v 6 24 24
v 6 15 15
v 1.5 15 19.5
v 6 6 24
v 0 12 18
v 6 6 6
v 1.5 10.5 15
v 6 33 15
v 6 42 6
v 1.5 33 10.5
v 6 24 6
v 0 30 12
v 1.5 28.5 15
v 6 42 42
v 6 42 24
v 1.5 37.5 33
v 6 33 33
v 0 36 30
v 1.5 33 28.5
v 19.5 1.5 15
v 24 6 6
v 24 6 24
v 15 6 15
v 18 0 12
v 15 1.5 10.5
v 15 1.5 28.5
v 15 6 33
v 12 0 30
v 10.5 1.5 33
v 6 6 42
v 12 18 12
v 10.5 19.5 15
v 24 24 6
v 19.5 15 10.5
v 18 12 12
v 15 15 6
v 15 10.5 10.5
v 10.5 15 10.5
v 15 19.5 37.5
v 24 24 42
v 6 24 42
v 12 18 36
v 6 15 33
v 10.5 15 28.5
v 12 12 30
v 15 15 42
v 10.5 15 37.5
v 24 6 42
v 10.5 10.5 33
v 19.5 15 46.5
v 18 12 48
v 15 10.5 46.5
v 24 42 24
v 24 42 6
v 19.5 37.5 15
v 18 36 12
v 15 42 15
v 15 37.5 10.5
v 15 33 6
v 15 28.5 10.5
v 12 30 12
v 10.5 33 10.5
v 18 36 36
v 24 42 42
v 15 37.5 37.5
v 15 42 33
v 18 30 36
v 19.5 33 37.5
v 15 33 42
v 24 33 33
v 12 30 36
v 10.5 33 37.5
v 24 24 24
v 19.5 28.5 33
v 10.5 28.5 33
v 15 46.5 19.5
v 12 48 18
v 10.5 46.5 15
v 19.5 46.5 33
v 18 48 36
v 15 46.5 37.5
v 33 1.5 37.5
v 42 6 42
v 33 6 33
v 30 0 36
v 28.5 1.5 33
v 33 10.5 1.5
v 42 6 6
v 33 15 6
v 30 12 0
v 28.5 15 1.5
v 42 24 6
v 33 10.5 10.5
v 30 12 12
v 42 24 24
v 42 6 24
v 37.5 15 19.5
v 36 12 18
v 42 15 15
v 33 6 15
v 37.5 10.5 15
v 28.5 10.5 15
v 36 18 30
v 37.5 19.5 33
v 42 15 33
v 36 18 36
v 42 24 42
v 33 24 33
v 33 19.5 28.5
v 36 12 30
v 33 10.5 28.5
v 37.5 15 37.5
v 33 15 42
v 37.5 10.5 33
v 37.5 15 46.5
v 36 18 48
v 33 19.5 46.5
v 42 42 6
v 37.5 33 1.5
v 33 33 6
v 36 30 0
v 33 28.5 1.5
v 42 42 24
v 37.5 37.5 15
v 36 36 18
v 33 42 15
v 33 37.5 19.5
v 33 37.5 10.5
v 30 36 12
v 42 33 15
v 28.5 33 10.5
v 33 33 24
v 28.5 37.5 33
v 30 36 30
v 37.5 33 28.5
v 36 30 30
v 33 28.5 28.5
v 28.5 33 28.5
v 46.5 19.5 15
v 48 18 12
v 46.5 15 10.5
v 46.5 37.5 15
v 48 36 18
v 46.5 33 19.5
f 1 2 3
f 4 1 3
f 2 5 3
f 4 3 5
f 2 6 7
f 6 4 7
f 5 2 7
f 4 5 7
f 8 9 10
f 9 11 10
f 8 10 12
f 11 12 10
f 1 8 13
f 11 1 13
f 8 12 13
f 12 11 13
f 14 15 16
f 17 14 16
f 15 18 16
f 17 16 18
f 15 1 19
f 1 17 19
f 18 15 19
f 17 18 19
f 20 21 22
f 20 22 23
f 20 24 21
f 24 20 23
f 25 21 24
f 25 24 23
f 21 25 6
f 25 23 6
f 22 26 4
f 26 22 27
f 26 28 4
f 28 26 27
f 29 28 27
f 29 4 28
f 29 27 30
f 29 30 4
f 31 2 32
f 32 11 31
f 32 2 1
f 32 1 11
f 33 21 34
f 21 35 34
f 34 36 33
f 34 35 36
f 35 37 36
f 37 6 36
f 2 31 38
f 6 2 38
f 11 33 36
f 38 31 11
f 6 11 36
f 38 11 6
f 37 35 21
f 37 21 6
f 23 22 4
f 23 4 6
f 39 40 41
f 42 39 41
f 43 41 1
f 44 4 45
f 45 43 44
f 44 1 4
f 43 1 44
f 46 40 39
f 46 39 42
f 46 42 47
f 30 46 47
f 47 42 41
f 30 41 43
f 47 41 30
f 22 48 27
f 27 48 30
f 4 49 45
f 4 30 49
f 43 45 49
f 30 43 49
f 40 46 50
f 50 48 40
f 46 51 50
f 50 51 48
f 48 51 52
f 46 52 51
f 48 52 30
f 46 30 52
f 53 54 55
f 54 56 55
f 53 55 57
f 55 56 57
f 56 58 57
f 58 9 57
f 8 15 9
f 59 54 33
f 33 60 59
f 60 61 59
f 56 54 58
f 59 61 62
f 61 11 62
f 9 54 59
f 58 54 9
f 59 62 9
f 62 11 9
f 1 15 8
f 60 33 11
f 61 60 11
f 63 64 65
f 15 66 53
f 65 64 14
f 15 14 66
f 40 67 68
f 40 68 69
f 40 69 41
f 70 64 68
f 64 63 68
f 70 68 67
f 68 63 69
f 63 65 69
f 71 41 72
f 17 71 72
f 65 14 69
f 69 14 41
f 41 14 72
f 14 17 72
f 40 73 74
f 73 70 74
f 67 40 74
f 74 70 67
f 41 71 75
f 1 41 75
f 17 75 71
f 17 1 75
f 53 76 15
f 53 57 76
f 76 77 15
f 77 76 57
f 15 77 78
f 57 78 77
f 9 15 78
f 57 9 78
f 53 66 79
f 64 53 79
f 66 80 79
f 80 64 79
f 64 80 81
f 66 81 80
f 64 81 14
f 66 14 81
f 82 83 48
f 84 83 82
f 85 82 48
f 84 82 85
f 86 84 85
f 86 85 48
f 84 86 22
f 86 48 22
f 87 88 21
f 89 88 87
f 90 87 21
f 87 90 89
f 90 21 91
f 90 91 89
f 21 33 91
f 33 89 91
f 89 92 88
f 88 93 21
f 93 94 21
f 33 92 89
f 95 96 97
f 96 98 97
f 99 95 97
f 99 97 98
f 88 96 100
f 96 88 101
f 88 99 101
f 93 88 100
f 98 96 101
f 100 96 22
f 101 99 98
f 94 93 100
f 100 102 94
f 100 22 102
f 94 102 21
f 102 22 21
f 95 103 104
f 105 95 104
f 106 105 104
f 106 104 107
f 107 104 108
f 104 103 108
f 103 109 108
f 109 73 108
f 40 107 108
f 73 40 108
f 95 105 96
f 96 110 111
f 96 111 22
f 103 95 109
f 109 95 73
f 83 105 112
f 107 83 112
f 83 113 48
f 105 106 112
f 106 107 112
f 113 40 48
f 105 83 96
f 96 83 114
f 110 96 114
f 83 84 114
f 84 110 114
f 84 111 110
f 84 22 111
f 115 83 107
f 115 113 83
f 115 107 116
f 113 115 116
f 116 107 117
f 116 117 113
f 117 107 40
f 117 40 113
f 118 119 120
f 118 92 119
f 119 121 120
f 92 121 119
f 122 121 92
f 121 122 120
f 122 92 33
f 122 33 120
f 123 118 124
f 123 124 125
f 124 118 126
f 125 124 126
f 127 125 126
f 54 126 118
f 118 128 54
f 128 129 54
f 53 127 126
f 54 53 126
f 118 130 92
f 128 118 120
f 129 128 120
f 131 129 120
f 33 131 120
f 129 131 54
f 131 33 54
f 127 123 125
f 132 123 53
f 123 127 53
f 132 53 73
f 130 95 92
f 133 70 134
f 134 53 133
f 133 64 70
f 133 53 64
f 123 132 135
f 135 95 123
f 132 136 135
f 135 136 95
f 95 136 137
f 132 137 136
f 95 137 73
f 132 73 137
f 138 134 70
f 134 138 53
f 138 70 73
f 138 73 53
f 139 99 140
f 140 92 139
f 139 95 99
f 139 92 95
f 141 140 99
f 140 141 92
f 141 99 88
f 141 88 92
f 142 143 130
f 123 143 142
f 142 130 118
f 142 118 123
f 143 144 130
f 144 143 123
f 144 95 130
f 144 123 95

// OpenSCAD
// Chair44: centered apex (2,1,1) on the original side-3 cube.
// Exact merged-cavity boundary: 98 planar faces, 284 mesh triangles.
// Change overall_width_mm to resize uniformly; dimensions are millimeters.
overall_width_mm = 48;
points_lattice = [[4,16,16],[4,10,10],[1,10,13],[4,4,16],[0,8,12],[4,4,4],[1,7,10],[4,22,10],[4,28,4],[1,22,7],[4,16,4],[0,20,8],[1,19,10],[4,28,28],[4,28,16],[1,25,22],[4,22,22],[0,24,20],[1,22,19],[13,1,10],[16,4,4],[16,4,16],[10,4,10],[12,0,8],[10,1,7],[10,1,19],[10,4,22],[8,0,20],[7,1,22],[4,4,28],[8,12,8],[7,13,10],[16,16,4],[13,10,7],[12,8,8],[10,10,4],[10,7,7],[7,10,7],[10,13,25],[16,16,28],[4,16,28],[8,12,24],[4,10,22],[7,10,19],[8,8,20],[10,10,28],[7,10,25],[16,4,28],[7,7,22],[13,10,31],[12,8,32],[10,7,31],[16,28,16],[16,28,4],[13,25,10],[12,24,8],[10,28,10],[10,25,7],[10,22,4],[10,19,7],[8,20,8],[7,22,7],[12,24,24],[16,28,28],[10,25,25],[10,28,22],[12,20,24],[13,22,25],[10,22,28],[16,22,22],[8,20,24],[7,22,25],[16,16,16],[13,19,22],[7,19,22],[10,31,13],[8,32,12],[7,31,10],[13,31,22],[12,32,24],[10,31,25],[22,1,25],[28,4,28],[22,4,22],[20,0,24],[19,1,22],[22,7,1],[28,4,4],[22,10,4],[20,8,0],[19,10,1],[28,16,4],[22,7,7],[20,8,8],[28,16,16],[28,4,16],[25,10,13],[24,8,12],[28,10,10],[22,4,10],[25,7,10],[19,7,10],[24,12,20],[25,13,22],[28,10,22],[24,12,24],[28,16,28],[22,16,22],[22,13,19],[24,8,20],[22,7,19],[25,10,25],[22,10,28],[25,7,22],[25,10,31],[24,12,32],[22,13,31],[28,28,4],[25,22,1],[22,22,4],[24,20,0],[22,19,1],[28,28,16],[25,25,10],[24,24,12],[22,28,10],[22,25,13],[22,25,7],[20,24,8],[28,22,10],[19,22,7],[22,22,16],[19,25,22],[20,24,20],[25,22,19],[24,20,20],[22,19,19],[19,22,19],[31,13,10],[32,12,8],[31,10,7],[31,25,10],[32,24,12],[31,22,13]];
faces_clockwise = [[2,1,0],[2,0,3],[2,4,1],[4,2,3],[6,5,1],[6,3,5],[6,1,4],[6,4,3],[9,8,7],[9,10,8],[11,9,7],[9,11,10],[12,7,0],[12,0,10],[12,11,7],[12,10,11],[15,14,13],[15,13,16],[15,17,14],[17,15,16],[18,0,14],[18,16,0],[18,14,17],[18,17,16],[21,20,19],[22,21,19],[20,23,19],[22,19,23],[23,20,24],[22,23,24],[5,24,20],[5,22,24],[3,25,21],[26,21,25],[3,27,25],[26,25,27],[26,27,28],[27,3,28],[29,26,28],[3,29,28],[31,1,30],[30,10,31],[0,1,31],[10,0,31],[33,20,32],[33,34,20],[32,35,33],[35,34,33],[35,36,34],[35,5,36],[37,30,1],[37,1,5],[35,32,10],[10,30,37],[35,10,5],[5,10,37],[20,34,36],[5,20,36],[3,21,22],[5,3,22],[40,39,38],[40,38,41],[0,40,42],[44,3,43],[43,42,44],[3,0,43],[43,0,42],[38,39,45],[41,38,45],[46,41,45],[46,45,29],[40,41,46],[42,40,29],[29,40,46],[26,47,21],[29,47,26],[44,48,3],[48,29,3],[48,44,42],[48,42,29],[49,45,39],[39,47,49],[49,50,45],[47,50,49],[51,50,47],[50,51,45],[29,51,47],[51,29,45],[54,53,52],[54,55,53],[56,54,52],[56,55,54],[56,57,55],[56,8,57],[8,14,7],[32,53,58],[58,59,32],[58,60,59],[57,53,55],[61,60,58],[61,10,60],[58,53,8],[8,53,57],[8,61,58],[8,10,61],[7,14,0],[10,32,59],[10,59,60],[64,63,62],[52,65,14],[13,63,64],[65,13,14],[67,66,39],[68,67,39],[40,68,39],[67,63,69],[67,62,63],[66,67,69],[68,62,67],[68,64,62],[71,40,70],[71,70,16],[68,13,64],[40,13,68],[71,13,40],[71,16,13],[73,72,39],[73,69,72],[73,39,66],[66,69,73],[74,70,40],[74,40,0],[70,74,16],[74,0,16],[14,75,52],[75,56,52],[14,76,75],[56,75,76],[77,76,14],[76,77,56],[77,14,8],[77,8,56],[78,65,52],[78,52,63],[78,79,65],[78,63,79],[80,79,63],[79,80,65],[13,80,63],[80,13,65],[47,82,81],[81,82,83],[47,81,84],[84,81,83],[84,83,85],[47,84,85],[21,85,83],[21,47,85],[20,87,86],[86,87,88],[20,86,89],[88,89,86],[90,20,89],[88,90,89],[90,32,20],[90,88,32],[87,91,88],[20,92,87],[20,93,92],[88,91,32],[96,95,94],[96,97,95],[96,94,98],[97,96,98],[99,95,87],[100,87,95],[100,98,87],[99,87,92],[100,95,97],[21,95,99],[97,98,100],[99,92,93],[93,101,99],[101,21,99],[20,101,93],[20,21,101],[103,102,94],[103,94,104],[103,104,105],[106,103,105],[107,103,106],[107,102,103],[107,108,102],[107,72,108],[107,106,39],[107,39,72],[95,104,94],[110,109,95],[21,110,95],[108,94,102],[72,94,108],[111,104,82],[111,82,106],[47,112,82],[111,105,104],[111,106,105],[47,39,112],[95,82,104],[113,82,95],[113,95,109],[113,83,82],[113,109,83],[109,110,83],[110,21,83],[106,82,114],[82,112,114],[115,106,114],[115,114,112],[116,106,115],[112,116,115],[39,106,116],[112,39,116],[119,118,117],[118,91,117],[119,120,118],[118,120,91],[91,120,121],[119,121,120],[32,91,121],[119,32,121],[123,117,122],[124,123,122],[125,117,123],[125,123,124],[125,124,126],[117,125,53],[53,127,117],[53,128,127],[125,126,52],[125,52,53],[91,129,117],[119,117,127],[119,127,128],[119,128,130],[119,130,32],[53,130,128],[53,32,130],[124,122,126],[52,122,131],[52,126,122],[72,52,131],[91,94,129],[133,69,132],[132,52,133],[69,63,132],[63,52,132],[134,131,122],[122,94,134],[134,135,131],[94,135,134],[136,135,94],[135,136,131],[72,136,94],[136,72,131],[69,133,137],[52,137,133],[72,69,137],[52,72,137],[139,98,138],[138,91,139],[98,94,138],[94,91,138],[98,139,140],[91,140,139],[87,98,140],[91,87,140],[129,142,141],[141,142,122],[117,129,141],[122,117,141],[129,143,142],[122,142,143],[129,94,143],[94,122,143]];
scale(overall_width_mm/32)
  polyhedron(points=points_lattice, faces=faces_clockwise, convexity=20);
